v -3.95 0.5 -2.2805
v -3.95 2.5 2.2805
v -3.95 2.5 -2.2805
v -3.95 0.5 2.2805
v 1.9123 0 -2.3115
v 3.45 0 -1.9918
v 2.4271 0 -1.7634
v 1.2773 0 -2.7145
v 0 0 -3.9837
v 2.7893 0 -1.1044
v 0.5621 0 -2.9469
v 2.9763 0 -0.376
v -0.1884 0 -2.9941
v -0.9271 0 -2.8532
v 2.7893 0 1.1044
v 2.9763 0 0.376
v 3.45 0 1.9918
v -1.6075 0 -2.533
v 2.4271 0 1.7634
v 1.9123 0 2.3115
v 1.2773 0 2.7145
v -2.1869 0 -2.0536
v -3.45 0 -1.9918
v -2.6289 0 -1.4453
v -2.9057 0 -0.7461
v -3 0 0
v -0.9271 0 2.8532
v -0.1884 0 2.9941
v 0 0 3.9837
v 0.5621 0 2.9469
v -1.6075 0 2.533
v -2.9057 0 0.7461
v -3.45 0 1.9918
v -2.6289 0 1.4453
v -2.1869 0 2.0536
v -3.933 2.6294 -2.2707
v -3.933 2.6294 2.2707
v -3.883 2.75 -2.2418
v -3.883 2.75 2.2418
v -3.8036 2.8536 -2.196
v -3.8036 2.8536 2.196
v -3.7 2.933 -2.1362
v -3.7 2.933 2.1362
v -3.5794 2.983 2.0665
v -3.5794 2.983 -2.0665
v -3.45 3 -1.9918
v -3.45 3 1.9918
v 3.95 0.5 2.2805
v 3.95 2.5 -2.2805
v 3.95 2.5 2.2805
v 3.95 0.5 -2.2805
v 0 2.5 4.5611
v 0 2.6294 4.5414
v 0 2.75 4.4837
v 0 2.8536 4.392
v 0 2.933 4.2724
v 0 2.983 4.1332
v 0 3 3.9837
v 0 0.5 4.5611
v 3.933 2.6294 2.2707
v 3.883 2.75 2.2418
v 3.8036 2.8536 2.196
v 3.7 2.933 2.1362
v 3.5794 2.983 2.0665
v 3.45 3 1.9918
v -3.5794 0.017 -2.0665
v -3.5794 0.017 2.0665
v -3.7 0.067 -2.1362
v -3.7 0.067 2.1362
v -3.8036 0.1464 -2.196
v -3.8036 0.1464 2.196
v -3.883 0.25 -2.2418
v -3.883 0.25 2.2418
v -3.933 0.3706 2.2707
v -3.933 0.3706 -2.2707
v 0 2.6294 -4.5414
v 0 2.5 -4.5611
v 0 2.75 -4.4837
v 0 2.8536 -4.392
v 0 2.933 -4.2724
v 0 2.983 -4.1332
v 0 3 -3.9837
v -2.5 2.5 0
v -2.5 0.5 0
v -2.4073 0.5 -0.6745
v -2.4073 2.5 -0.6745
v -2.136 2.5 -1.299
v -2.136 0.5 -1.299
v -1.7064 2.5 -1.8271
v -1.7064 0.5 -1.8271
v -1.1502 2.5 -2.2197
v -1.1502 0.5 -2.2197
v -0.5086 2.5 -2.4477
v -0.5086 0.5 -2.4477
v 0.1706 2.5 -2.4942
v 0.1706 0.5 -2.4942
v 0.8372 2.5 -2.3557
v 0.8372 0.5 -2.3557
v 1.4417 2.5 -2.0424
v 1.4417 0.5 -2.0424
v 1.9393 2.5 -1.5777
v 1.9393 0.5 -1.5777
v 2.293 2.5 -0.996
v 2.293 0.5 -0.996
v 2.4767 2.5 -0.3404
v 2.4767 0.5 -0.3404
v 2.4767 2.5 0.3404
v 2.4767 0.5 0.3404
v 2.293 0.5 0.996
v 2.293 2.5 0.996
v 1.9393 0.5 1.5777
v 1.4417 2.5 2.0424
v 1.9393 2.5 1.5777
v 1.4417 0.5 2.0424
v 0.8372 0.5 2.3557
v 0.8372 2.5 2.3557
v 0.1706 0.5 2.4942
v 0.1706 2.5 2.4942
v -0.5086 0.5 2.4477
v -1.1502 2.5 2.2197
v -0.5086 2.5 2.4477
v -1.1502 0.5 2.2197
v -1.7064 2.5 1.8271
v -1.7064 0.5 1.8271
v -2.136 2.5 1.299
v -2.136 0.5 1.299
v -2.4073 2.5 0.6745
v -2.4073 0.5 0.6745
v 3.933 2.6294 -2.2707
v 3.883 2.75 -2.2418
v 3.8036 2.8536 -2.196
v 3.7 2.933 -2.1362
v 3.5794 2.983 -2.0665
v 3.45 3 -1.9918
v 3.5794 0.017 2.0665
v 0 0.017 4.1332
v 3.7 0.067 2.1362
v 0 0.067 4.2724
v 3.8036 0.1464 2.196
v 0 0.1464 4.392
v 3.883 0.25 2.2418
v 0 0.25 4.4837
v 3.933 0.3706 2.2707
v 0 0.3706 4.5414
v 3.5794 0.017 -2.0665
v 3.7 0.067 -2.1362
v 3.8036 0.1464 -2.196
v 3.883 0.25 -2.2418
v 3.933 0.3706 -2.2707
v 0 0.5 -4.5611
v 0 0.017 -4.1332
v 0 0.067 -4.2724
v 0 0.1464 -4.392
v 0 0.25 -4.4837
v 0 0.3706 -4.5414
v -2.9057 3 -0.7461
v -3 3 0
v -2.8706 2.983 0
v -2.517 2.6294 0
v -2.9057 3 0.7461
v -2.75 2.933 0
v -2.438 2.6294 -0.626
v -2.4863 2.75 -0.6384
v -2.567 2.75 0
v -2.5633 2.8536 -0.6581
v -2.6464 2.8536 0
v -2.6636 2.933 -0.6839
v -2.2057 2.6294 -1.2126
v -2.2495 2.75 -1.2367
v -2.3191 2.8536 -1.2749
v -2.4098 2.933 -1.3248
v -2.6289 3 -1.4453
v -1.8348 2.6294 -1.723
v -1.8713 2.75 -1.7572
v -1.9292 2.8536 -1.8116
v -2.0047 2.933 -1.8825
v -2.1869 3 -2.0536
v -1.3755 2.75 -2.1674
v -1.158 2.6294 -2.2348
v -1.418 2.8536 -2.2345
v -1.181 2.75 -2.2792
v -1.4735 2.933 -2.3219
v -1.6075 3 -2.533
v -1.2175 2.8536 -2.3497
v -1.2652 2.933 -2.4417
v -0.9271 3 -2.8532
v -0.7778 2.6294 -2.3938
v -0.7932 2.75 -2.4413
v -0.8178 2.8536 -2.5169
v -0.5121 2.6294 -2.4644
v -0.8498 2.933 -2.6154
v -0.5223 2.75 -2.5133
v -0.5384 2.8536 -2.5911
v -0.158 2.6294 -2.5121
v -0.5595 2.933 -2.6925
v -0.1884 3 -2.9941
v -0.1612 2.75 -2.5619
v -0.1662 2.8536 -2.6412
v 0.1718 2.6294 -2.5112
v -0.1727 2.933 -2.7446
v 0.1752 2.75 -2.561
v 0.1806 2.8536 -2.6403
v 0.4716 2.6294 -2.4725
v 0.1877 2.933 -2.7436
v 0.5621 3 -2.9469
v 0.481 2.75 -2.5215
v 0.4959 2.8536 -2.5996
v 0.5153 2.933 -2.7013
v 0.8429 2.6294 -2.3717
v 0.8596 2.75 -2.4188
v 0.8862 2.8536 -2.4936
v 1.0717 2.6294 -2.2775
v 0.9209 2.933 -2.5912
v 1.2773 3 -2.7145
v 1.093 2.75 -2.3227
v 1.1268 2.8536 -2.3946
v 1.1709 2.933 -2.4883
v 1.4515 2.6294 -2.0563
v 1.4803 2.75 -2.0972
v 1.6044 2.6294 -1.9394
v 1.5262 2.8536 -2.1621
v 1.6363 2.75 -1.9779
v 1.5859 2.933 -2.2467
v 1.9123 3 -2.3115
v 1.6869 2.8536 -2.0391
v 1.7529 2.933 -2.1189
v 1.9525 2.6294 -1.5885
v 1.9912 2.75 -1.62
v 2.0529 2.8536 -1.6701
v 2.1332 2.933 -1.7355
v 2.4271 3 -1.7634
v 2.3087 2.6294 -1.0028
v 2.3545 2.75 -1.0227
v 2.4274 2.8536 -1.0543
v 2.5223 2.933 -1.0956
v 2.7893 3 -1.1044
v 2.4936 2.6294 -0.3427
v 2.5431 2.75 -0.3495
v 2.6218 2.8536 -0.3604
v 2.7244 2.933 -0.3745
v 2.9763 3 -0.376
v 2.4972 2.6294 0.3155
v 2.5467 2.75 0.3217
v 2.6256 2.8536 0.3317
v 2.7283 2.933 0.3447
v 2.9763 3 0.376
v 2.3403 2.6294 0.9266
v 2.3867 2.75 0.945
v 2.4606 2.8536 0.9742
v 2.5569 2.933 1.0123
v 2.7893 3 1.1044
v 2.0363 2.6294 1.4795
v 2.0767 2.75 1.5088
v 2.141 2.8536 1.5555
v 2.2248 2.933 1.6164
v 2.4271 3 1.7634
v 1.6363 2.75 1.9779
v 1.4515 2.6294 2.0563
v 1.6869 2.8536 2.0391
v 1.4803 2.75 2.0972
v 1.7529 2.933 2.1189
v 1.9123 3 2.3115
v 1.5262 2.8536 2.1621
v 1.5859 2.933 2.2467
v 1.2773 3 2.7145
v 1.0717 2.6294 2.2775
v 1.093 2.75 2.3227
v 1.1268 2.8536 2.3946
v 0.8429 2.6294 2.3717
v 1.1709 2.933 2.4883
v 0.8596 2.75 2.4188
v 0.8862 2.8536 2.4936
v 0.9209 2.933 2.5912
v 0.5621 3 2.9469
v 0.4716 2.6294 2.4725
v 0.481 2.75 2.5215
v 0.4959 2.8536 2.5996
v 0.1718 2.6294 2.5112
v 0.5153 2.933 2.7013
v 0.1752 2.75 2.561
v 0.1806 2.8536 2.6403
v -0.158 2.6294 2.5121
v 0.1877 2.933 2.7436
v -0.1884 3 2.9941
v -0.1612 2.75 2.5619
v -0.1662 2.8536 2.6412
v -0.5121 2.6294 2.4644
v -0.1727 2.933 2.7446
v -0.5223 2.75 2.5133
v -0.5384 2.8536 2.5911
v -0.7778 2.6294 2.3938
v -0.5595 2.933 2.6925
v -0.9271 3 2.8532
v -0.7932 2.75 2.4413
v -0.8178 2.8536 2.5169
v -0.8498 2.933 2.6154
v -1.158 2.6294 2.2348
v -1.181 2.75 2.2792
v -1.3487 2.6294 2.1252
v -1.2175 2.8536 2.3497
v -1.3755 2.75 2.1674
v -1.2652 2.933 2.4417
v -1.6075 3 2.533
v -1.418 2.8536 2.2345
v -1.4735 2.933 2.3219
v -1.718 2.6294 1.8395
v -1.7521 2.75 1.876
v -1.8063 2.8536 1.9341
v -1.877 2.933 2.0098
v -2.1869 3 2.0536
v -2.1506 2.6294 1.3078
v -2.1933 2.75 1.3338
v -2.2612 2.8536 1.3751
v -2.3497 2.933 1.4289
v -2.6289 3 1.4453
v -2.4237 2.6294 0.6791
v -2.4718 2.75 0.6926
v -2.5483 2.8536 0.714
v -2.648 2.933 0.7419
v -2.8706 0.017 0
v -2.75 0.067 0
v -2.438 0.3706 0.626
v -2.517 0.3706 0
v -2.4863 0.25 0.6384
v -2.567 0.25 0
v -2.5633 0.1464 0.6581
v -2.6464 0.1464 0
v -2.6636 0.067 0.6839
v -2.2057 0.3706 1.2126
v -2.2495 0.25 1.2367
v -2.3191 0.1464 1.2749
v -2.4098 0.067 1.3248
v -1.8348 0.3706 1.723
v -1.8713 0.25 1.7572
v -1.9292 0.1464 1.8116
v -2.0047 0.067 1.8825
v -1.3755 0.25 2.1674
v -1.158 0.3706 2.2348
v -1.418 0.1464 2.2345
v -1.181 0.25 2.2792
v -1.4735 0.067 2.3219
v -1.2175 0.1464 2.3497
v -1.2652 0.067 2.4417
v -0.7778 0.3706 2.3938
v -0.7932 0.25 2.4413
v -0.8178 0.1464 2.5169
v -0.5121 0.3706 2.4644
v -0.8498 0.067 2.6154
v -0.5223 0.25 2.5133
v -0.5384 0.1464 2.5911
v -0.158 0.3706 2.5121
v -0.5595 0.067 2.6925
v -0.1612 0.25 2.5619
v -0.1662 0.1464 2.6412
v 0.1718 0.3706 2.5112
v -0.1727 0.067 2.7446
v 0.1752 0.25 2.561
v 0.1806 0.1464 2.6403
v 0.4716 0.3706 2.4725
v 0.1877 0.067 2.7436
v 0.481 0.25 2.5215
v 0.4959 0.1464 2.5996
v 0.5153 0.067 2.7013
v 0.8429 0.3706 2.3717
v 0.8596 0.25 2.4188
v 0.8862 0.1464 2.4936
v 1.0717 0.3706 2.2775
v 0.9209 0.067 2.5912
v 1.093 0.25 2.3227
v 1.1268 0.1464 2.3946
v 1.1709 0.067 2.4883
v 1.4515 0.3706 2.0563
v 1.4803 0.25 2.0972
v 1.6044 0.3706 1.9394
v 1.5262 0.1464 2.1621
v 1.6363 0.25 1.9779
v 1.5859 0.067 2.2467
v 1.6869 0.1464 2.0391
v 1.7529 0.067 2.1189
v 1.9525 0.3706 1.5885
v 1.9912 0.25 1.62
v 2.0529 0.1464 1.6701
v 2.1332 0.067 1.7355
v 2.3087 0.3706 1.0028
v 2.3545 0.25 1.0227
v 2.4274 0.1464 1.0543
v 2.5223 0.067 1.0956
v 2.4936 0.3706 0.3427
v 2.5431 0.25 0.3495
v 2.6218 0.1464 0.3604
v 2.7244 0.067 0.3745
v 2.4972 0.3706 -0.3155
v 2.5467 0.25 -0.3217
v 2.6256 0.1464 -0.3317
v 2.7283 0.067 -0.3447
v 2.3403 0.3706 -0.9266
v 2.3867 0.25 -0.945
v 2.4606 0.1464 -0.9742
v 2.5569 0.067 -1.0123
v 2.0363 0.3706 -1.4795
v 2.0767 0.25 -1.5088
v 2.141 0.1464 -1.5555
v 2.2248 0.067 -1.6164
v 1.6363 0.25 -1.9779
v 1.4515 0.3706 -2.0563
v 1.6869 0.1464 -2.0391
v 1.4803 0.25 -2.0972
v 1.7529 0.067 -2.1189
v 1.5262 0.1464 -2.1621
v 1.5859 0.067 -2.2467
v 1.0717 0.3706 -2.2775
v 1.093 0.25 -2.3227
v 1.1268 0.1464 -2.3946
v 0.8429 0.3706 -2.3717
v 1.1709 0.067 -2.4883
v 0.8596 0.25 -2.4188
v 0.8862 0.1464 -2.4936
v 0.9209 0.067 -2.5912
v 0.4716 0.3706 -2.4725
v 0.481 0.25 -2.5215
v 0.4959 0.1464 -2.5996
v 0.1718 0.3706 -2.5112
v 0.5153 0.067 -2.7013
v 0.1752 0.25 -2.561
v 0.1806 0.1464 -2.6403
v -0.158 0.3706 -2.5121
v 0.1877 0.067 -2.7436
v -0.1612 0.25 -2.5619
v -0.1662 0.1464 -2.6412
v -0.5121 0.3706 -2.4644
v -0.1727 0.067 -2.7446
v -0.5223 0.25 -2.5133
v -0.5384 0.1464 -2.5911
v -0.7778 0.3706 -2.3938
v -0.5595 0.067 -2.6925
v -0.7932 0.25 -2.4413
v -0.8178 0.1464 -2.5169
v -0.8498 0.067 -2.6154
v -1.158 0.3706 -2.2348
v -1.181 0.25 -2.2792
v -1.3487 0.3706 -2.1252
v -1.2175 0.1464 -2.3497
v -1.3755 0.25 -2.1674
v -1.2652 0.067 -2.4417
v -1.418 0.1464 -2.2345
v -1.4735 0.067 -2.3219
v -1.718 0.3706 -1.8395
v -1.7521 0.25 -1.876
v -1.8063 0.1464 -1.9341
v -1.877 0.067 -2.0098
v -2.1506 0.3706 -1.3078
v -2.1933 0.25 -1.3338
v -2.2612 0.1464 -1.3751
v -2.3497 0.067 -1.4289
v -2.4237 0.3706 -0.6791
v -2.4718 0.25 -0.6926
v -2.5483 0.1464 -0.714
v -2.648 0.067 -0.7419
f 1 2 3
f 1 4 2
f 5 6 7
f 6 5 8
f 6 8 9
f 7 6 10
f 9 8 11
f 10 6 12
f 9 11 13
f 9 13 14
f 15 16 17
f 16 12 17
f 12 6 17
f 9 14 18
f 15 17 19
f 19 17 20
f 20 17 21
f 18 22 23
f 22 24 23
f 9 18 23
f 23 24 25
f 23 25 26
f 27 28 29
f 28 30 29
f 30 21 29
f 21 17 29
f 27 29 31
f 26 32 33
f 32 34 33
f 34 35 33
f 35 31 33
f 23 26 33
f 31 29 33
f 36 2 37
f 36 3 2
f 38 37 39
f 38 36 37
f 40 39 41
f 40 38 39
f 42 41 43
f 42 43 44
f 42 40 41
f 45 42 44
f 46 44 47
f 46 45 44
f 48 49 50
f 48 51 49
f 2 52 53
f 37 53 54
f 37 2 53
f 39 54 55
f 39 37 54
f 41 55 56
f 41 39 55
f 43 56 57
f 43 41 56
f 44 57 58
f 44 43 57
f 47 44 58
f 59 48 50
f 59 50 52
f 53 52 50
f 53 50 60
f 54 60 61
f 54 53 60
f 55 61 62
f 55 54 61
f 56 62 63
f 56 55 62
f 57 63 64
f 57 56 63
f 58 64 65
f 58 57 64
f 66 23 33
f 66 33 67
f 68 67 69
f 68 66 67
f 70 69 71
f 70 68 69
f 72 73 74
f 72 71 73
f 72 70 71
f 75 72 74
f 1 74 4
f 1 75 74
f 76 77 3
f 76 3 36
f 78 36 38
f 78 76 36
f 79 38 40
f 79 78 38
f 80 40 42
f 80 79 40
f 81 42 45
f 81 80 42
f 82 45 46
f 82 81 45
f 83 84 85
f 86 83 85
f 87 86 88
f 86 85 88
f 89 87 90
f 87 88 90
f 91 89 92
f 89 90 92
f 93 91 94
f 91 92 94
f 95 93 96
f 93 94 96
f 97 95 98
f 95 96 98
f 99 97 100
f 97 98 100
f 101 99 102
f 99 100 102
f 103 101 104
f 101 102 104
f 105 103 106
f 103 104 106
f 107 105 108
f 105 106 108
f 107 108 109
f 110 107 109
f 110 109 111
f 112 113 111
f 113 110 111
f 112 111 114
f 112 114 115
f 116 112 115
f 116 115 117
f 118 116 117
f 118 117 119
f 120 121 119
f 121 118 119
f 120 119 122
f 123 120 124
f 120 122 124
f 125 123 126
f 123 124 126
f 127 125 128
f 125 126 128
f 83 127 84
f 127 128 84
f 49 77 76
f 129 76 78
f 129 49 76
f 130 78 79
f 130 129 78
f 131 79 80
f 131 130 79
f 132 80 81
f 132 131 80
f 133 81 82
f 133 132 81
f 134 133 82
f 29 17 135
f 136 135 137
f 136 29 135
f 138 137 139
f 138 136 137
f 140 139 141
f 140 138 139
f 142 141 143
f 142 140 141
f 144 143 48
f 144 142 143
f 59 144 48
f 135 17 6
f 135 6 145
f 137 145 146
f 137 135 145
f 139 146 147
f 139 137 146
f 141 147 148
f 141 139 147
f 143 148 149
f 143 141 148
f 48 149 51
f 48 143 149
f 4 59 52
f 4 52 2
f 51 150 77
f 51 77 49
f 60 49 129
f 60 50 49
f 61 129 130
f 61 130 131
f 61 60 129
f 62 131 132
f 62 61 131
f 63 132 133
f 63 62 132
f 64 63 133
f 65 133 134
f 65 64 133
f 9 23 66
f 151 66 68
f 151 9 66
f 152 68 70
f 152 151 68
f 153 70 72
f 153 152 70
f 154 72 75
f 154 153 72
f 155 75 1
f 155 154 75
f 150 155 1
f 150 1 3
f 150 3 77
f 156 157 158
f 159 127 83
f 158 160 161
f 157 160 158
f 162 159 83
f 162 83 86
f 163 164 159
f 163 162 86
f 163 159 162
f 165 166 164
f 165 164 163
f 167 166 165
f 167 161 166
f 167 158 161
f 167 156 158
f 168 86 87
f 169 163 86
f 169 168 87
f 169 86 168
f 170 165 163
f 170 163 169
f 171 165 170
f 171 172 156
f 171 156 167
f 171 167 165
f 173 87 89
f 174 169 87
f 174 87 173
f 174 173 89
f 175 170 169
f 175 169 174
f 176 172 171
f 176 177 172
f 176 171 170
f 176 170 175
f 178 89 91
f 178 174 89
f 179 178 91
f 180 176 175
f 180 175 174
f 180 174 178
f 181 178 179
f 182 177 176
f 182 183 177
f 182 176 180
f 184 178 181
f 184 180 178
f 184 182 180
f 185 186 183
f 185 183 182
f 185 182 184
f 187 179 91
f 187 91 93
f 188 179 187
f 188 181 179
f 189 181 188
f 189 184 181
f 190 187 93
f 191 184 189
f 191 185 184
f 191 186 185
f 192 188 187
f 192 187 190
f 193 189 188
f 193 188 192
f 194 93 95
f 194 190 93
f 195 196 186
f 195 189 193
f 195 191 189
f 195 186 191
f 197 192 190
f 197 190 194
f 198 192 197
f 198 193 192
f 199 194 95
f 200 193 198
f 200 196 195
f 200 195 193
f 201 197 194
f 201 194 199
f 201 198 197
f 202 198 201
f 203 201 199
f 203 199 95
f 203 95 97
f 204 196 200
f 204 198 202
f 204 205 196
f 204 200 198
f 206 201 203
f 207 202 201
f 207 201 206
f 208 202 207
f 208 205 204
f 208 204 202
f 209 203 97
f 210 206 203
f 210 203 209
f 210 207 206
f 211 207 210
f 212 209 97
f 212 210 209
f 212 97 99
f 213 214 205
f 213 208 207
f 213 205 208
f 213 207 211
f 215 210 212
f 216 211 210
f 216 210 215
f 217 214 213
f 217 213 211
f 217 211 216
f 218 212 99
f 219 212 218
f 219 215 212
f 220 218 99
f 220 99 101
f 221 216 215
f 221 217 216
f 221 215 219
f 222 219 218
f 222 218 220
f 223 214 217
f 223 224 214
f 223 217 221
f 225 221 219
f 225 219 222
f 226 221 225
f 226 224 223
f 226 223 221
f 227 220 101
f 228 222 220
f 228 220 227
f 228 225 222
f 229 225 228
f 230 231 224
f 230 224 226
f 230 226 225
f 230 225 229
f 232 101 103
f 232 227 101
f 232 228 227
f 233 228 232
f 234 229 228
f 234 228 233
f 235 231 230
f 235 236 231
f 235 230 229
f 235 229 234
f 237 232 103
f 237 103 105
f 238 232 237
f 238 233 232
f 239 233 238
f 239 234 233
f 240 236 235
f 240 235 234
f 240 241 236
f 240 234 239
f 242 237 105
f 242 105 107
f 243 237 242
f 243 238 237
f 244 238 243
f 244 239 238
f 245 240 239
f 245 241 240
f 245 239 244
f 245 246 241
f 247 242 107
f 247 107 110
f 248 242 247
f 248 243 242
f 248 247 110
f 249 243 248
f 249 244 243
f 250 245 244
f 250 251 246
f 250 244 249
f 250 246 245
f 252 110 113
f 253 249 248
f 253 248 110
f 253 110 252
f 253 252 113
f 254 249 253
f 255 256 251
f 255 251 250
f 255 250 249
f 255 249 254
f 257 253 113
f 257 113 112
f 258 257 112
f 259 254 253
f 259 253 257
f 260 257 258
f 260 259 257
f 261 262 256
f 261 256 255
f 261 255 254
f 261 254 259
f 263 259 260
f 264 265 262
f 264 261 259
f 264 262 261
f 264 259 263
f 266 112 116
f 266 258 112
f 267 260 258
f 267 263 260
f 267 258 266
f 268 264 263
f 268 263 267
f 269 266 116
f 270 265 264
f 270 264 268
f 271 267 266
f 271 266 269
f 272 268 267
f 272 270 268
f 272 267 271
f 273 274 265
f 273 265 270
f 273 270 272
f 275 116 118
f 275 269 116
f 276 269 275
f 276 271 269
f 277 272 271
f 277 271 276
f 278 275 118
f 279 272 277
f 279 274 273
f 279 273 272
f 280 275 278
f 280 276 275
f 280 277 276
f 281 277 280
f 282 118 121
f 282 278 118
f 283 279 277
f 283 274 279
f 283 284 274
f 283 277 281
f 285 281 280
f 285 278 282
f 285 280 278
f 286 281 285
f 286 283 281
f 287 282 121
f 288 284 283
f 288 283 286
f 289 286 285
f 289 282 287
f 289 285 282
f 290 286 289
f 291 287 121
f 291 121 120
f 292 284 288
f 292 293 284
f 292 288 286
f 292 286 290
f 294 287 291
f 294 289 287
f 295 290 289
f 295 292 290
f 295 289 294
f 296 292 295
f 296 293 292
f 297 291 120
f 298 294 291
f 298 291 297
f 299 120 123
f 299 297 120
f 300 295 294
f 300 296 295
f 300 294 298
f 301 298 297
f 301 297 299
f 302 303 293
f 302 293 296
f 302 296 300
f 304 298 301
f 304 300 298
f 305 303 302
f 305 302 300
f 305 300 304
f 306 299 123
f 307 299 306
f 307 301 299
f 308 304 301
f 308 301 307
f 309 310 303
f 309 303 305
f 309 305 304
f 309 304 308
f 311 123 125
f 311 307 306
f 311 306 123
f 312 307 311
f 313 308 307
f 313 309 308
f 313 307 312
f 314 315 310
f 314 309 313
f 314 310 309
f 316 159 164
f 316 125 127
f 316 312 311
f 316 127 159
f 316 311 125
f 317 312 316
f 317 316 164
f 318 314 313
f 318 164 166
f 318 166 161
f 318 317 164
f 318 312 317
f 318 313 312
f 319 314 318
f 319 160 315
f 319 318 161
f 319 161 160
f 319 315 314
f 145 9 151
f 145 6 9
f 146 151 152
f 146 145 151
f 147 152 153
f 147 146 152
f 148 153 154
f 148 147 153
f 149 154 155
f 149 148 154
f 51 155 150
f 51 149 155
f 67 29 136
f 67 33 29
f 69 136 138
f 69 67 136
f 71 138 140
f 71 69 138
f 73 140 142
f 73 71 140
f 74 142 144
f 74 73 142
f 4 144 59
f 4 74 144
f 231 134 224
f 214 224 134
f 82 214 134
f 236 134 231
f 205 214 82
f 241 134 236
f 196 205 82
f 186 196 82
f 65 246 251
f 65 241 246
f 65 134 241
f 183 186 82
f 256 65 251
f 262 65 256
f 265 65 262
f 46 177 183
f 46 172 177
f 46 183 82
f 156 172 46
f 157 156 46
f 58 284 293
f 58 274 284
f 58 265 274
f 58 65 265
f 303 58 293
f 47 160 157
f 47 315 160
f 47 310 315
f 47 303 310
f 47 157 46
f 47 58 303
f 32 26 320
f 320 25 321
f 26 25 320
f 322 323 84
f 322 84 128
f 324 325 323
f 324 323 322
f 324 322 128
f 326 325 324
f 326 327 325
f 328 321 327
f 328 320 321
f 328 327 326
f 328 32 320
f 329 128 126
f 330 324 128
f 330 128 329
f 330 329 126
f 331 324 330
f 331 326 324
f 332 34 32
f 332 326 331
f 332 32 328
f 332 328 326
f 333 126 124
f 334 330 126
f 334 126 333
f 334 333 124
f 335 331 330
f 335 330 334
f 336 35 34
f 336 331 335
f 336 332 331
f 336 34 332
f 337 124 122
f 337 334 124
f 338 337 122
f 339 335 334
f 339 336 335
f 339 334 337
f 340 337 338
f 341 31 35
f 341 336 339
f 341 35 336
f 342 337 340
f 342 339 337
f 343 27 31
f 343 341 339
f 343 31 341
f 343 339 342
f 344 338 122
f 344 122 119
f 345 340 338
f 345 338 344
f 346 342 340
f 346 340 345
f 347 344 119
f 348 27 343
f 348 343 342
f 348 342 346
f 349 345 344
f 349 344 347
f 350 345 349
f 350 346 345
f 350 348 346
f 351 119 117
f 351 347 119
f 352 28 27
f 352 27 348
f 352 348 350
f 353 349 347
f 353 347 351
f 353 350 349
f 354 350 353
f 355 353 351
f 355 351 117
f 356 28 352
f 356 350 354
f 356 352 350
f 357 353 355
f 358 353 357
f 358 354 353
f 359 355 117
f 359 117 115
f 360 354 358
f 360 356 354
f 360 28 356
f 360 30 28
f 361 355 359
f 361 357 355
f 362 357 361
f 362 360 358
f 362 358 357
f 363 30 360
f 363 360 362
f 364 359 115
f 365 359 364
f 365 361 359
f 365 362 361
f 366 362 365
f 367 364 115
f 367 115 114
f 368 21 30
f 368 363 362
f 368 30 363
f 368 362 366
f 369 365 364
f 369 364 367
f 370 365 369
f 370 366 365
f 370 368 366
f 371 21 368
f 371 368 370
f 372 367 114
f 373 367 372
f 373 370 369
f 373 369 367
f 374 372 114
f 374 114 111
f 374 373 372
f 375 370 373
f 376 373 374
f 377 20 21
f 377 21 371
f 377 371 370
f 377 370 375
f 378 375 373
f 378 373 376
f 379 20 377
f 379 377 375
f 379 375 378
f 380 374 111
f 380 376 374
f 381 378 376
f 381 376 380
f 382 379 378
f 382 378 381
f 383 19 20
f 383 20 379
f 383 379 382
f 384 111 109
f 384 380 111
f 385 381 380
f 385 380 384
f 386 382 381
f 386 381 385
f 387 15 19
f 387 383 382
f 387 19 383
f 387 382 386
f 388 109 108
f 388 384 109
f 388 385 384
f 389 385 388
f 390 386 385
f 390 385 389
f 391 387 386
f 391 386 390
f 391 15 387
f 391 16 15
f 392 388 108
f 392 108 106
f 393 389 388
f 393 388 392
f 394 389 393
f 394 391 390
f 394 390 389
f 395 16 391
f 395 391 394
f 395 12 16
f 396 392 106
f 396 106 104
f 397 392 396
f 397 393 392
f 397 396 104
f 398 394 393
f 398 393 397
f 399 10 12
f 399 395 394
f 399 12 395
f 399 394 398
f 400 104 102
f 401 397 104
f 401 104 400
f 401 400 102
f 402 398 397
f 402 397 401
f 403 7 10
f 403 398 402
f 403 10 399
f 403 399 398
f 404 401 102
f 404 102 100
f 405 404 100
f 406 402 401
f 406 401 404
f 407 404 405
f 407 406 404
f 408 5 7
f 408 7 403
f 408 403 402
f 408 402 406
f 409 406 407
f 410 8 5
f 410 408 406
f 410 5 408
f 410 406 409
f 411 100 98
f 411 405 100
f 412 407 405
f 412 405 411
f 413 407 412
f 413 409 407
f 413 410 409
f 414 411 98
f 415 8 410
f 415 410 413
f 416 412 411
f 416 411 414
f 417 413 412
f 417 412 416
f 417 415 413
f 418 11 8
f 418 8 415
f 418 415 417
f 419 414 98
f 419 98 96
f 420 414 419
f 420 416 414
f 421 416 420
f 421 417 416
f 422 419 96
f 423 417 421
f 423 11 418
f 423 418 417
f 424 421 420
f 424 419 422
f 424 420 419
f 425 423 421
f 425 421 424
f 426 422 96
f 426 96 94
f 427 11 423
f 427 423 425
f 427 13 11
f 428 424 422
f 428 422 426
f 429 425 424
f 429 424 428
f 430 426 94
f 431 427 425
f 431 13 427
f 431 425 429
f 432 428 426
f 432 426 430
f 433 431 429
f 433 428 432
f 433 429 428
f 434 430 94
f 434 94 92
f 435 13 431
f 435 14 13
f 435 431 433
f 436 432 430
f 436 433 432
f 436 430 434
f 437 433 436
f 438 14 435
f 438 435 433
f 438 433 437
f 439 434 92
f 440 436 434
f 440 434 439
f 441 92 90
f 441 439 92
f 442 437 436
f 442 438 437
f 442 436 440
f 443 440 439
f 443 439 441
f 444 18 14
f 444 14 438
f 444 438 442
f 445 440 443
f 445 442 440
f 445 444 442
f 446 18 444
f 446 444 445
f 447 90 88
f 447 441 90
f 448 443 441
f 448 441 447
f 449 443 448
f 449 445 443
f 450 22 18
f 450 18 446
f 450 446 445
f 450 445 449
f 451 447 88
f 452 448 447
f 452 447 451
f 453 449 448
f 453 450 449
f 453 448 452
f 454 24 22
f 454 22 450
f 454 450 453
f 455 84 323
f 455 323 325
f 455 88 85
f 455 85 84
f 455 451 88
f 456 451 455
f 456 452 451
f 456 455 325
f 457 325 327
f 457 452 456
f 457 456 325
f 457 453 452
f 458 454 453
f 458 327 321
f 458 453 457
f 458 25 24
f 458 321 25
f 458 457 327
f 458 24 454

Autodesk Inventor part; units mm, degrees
ref_plane "YZ Plane" through (0, 0, 0) normal (1, 0, 0) x (0, 1, 0)
ref_plane "XZ Plane" through (0, 0, 0) normal (0, 1, 0) x (-1, 0, 0)
ref_plane "XY Plane" through (0, 0, 0) normal (0, 0, 1) x (1, 0, 0)
sketch "Sketch1" plane through (0, 0, 0) normal (0, 1, 0) x (-1, 0, 0)
  line L0 (3.95, -2.2805) -> (0, -4.5611)
  line L1 (0, -4.5611) -> (-3.95, -2.2805)
  line L2 (-3.95, -2.2805) -> (-3.95, 2.2805)
  line L3 (-3.95, 2.2805) -> (0, 4.5611)
  line L4 (0, 4.5611) -> (3.95, 2.2805)
  line L5 (3.95, 2.2805) -> (3.95, -2.2805)
  circle A0 centre (0, 0) radius 2.5
  dimension "d0" = 3.95
  dimension "d1" = 5
extrude "Extrusion1" add sketch "Sketch1" along normal blind 3
fillet "Fillet1" radius 0.5 14 edges at (3.95, 3, 0) (1.975, 3, -3.4208) (-1.975, 3, -3.4208) (-3.95, 3, 0) (-1.975, 3, 3.4208) (1.975, 3, 3.4208) (3.95, 0, 0) (1.975, 0, 3.4208) (-1.975, 0, 3.4208) (-3.95, 0, 0) (-1.975, 0, -3.4208) (1.975, 0, -3.4208) (2.5, 0, 0) (2.5, 3, 0)
thread "Thread1" size "M5x0.8" class "6H" standard "ANSI Metric M Profile" full length
properties part number "M5 Nut Silver"
